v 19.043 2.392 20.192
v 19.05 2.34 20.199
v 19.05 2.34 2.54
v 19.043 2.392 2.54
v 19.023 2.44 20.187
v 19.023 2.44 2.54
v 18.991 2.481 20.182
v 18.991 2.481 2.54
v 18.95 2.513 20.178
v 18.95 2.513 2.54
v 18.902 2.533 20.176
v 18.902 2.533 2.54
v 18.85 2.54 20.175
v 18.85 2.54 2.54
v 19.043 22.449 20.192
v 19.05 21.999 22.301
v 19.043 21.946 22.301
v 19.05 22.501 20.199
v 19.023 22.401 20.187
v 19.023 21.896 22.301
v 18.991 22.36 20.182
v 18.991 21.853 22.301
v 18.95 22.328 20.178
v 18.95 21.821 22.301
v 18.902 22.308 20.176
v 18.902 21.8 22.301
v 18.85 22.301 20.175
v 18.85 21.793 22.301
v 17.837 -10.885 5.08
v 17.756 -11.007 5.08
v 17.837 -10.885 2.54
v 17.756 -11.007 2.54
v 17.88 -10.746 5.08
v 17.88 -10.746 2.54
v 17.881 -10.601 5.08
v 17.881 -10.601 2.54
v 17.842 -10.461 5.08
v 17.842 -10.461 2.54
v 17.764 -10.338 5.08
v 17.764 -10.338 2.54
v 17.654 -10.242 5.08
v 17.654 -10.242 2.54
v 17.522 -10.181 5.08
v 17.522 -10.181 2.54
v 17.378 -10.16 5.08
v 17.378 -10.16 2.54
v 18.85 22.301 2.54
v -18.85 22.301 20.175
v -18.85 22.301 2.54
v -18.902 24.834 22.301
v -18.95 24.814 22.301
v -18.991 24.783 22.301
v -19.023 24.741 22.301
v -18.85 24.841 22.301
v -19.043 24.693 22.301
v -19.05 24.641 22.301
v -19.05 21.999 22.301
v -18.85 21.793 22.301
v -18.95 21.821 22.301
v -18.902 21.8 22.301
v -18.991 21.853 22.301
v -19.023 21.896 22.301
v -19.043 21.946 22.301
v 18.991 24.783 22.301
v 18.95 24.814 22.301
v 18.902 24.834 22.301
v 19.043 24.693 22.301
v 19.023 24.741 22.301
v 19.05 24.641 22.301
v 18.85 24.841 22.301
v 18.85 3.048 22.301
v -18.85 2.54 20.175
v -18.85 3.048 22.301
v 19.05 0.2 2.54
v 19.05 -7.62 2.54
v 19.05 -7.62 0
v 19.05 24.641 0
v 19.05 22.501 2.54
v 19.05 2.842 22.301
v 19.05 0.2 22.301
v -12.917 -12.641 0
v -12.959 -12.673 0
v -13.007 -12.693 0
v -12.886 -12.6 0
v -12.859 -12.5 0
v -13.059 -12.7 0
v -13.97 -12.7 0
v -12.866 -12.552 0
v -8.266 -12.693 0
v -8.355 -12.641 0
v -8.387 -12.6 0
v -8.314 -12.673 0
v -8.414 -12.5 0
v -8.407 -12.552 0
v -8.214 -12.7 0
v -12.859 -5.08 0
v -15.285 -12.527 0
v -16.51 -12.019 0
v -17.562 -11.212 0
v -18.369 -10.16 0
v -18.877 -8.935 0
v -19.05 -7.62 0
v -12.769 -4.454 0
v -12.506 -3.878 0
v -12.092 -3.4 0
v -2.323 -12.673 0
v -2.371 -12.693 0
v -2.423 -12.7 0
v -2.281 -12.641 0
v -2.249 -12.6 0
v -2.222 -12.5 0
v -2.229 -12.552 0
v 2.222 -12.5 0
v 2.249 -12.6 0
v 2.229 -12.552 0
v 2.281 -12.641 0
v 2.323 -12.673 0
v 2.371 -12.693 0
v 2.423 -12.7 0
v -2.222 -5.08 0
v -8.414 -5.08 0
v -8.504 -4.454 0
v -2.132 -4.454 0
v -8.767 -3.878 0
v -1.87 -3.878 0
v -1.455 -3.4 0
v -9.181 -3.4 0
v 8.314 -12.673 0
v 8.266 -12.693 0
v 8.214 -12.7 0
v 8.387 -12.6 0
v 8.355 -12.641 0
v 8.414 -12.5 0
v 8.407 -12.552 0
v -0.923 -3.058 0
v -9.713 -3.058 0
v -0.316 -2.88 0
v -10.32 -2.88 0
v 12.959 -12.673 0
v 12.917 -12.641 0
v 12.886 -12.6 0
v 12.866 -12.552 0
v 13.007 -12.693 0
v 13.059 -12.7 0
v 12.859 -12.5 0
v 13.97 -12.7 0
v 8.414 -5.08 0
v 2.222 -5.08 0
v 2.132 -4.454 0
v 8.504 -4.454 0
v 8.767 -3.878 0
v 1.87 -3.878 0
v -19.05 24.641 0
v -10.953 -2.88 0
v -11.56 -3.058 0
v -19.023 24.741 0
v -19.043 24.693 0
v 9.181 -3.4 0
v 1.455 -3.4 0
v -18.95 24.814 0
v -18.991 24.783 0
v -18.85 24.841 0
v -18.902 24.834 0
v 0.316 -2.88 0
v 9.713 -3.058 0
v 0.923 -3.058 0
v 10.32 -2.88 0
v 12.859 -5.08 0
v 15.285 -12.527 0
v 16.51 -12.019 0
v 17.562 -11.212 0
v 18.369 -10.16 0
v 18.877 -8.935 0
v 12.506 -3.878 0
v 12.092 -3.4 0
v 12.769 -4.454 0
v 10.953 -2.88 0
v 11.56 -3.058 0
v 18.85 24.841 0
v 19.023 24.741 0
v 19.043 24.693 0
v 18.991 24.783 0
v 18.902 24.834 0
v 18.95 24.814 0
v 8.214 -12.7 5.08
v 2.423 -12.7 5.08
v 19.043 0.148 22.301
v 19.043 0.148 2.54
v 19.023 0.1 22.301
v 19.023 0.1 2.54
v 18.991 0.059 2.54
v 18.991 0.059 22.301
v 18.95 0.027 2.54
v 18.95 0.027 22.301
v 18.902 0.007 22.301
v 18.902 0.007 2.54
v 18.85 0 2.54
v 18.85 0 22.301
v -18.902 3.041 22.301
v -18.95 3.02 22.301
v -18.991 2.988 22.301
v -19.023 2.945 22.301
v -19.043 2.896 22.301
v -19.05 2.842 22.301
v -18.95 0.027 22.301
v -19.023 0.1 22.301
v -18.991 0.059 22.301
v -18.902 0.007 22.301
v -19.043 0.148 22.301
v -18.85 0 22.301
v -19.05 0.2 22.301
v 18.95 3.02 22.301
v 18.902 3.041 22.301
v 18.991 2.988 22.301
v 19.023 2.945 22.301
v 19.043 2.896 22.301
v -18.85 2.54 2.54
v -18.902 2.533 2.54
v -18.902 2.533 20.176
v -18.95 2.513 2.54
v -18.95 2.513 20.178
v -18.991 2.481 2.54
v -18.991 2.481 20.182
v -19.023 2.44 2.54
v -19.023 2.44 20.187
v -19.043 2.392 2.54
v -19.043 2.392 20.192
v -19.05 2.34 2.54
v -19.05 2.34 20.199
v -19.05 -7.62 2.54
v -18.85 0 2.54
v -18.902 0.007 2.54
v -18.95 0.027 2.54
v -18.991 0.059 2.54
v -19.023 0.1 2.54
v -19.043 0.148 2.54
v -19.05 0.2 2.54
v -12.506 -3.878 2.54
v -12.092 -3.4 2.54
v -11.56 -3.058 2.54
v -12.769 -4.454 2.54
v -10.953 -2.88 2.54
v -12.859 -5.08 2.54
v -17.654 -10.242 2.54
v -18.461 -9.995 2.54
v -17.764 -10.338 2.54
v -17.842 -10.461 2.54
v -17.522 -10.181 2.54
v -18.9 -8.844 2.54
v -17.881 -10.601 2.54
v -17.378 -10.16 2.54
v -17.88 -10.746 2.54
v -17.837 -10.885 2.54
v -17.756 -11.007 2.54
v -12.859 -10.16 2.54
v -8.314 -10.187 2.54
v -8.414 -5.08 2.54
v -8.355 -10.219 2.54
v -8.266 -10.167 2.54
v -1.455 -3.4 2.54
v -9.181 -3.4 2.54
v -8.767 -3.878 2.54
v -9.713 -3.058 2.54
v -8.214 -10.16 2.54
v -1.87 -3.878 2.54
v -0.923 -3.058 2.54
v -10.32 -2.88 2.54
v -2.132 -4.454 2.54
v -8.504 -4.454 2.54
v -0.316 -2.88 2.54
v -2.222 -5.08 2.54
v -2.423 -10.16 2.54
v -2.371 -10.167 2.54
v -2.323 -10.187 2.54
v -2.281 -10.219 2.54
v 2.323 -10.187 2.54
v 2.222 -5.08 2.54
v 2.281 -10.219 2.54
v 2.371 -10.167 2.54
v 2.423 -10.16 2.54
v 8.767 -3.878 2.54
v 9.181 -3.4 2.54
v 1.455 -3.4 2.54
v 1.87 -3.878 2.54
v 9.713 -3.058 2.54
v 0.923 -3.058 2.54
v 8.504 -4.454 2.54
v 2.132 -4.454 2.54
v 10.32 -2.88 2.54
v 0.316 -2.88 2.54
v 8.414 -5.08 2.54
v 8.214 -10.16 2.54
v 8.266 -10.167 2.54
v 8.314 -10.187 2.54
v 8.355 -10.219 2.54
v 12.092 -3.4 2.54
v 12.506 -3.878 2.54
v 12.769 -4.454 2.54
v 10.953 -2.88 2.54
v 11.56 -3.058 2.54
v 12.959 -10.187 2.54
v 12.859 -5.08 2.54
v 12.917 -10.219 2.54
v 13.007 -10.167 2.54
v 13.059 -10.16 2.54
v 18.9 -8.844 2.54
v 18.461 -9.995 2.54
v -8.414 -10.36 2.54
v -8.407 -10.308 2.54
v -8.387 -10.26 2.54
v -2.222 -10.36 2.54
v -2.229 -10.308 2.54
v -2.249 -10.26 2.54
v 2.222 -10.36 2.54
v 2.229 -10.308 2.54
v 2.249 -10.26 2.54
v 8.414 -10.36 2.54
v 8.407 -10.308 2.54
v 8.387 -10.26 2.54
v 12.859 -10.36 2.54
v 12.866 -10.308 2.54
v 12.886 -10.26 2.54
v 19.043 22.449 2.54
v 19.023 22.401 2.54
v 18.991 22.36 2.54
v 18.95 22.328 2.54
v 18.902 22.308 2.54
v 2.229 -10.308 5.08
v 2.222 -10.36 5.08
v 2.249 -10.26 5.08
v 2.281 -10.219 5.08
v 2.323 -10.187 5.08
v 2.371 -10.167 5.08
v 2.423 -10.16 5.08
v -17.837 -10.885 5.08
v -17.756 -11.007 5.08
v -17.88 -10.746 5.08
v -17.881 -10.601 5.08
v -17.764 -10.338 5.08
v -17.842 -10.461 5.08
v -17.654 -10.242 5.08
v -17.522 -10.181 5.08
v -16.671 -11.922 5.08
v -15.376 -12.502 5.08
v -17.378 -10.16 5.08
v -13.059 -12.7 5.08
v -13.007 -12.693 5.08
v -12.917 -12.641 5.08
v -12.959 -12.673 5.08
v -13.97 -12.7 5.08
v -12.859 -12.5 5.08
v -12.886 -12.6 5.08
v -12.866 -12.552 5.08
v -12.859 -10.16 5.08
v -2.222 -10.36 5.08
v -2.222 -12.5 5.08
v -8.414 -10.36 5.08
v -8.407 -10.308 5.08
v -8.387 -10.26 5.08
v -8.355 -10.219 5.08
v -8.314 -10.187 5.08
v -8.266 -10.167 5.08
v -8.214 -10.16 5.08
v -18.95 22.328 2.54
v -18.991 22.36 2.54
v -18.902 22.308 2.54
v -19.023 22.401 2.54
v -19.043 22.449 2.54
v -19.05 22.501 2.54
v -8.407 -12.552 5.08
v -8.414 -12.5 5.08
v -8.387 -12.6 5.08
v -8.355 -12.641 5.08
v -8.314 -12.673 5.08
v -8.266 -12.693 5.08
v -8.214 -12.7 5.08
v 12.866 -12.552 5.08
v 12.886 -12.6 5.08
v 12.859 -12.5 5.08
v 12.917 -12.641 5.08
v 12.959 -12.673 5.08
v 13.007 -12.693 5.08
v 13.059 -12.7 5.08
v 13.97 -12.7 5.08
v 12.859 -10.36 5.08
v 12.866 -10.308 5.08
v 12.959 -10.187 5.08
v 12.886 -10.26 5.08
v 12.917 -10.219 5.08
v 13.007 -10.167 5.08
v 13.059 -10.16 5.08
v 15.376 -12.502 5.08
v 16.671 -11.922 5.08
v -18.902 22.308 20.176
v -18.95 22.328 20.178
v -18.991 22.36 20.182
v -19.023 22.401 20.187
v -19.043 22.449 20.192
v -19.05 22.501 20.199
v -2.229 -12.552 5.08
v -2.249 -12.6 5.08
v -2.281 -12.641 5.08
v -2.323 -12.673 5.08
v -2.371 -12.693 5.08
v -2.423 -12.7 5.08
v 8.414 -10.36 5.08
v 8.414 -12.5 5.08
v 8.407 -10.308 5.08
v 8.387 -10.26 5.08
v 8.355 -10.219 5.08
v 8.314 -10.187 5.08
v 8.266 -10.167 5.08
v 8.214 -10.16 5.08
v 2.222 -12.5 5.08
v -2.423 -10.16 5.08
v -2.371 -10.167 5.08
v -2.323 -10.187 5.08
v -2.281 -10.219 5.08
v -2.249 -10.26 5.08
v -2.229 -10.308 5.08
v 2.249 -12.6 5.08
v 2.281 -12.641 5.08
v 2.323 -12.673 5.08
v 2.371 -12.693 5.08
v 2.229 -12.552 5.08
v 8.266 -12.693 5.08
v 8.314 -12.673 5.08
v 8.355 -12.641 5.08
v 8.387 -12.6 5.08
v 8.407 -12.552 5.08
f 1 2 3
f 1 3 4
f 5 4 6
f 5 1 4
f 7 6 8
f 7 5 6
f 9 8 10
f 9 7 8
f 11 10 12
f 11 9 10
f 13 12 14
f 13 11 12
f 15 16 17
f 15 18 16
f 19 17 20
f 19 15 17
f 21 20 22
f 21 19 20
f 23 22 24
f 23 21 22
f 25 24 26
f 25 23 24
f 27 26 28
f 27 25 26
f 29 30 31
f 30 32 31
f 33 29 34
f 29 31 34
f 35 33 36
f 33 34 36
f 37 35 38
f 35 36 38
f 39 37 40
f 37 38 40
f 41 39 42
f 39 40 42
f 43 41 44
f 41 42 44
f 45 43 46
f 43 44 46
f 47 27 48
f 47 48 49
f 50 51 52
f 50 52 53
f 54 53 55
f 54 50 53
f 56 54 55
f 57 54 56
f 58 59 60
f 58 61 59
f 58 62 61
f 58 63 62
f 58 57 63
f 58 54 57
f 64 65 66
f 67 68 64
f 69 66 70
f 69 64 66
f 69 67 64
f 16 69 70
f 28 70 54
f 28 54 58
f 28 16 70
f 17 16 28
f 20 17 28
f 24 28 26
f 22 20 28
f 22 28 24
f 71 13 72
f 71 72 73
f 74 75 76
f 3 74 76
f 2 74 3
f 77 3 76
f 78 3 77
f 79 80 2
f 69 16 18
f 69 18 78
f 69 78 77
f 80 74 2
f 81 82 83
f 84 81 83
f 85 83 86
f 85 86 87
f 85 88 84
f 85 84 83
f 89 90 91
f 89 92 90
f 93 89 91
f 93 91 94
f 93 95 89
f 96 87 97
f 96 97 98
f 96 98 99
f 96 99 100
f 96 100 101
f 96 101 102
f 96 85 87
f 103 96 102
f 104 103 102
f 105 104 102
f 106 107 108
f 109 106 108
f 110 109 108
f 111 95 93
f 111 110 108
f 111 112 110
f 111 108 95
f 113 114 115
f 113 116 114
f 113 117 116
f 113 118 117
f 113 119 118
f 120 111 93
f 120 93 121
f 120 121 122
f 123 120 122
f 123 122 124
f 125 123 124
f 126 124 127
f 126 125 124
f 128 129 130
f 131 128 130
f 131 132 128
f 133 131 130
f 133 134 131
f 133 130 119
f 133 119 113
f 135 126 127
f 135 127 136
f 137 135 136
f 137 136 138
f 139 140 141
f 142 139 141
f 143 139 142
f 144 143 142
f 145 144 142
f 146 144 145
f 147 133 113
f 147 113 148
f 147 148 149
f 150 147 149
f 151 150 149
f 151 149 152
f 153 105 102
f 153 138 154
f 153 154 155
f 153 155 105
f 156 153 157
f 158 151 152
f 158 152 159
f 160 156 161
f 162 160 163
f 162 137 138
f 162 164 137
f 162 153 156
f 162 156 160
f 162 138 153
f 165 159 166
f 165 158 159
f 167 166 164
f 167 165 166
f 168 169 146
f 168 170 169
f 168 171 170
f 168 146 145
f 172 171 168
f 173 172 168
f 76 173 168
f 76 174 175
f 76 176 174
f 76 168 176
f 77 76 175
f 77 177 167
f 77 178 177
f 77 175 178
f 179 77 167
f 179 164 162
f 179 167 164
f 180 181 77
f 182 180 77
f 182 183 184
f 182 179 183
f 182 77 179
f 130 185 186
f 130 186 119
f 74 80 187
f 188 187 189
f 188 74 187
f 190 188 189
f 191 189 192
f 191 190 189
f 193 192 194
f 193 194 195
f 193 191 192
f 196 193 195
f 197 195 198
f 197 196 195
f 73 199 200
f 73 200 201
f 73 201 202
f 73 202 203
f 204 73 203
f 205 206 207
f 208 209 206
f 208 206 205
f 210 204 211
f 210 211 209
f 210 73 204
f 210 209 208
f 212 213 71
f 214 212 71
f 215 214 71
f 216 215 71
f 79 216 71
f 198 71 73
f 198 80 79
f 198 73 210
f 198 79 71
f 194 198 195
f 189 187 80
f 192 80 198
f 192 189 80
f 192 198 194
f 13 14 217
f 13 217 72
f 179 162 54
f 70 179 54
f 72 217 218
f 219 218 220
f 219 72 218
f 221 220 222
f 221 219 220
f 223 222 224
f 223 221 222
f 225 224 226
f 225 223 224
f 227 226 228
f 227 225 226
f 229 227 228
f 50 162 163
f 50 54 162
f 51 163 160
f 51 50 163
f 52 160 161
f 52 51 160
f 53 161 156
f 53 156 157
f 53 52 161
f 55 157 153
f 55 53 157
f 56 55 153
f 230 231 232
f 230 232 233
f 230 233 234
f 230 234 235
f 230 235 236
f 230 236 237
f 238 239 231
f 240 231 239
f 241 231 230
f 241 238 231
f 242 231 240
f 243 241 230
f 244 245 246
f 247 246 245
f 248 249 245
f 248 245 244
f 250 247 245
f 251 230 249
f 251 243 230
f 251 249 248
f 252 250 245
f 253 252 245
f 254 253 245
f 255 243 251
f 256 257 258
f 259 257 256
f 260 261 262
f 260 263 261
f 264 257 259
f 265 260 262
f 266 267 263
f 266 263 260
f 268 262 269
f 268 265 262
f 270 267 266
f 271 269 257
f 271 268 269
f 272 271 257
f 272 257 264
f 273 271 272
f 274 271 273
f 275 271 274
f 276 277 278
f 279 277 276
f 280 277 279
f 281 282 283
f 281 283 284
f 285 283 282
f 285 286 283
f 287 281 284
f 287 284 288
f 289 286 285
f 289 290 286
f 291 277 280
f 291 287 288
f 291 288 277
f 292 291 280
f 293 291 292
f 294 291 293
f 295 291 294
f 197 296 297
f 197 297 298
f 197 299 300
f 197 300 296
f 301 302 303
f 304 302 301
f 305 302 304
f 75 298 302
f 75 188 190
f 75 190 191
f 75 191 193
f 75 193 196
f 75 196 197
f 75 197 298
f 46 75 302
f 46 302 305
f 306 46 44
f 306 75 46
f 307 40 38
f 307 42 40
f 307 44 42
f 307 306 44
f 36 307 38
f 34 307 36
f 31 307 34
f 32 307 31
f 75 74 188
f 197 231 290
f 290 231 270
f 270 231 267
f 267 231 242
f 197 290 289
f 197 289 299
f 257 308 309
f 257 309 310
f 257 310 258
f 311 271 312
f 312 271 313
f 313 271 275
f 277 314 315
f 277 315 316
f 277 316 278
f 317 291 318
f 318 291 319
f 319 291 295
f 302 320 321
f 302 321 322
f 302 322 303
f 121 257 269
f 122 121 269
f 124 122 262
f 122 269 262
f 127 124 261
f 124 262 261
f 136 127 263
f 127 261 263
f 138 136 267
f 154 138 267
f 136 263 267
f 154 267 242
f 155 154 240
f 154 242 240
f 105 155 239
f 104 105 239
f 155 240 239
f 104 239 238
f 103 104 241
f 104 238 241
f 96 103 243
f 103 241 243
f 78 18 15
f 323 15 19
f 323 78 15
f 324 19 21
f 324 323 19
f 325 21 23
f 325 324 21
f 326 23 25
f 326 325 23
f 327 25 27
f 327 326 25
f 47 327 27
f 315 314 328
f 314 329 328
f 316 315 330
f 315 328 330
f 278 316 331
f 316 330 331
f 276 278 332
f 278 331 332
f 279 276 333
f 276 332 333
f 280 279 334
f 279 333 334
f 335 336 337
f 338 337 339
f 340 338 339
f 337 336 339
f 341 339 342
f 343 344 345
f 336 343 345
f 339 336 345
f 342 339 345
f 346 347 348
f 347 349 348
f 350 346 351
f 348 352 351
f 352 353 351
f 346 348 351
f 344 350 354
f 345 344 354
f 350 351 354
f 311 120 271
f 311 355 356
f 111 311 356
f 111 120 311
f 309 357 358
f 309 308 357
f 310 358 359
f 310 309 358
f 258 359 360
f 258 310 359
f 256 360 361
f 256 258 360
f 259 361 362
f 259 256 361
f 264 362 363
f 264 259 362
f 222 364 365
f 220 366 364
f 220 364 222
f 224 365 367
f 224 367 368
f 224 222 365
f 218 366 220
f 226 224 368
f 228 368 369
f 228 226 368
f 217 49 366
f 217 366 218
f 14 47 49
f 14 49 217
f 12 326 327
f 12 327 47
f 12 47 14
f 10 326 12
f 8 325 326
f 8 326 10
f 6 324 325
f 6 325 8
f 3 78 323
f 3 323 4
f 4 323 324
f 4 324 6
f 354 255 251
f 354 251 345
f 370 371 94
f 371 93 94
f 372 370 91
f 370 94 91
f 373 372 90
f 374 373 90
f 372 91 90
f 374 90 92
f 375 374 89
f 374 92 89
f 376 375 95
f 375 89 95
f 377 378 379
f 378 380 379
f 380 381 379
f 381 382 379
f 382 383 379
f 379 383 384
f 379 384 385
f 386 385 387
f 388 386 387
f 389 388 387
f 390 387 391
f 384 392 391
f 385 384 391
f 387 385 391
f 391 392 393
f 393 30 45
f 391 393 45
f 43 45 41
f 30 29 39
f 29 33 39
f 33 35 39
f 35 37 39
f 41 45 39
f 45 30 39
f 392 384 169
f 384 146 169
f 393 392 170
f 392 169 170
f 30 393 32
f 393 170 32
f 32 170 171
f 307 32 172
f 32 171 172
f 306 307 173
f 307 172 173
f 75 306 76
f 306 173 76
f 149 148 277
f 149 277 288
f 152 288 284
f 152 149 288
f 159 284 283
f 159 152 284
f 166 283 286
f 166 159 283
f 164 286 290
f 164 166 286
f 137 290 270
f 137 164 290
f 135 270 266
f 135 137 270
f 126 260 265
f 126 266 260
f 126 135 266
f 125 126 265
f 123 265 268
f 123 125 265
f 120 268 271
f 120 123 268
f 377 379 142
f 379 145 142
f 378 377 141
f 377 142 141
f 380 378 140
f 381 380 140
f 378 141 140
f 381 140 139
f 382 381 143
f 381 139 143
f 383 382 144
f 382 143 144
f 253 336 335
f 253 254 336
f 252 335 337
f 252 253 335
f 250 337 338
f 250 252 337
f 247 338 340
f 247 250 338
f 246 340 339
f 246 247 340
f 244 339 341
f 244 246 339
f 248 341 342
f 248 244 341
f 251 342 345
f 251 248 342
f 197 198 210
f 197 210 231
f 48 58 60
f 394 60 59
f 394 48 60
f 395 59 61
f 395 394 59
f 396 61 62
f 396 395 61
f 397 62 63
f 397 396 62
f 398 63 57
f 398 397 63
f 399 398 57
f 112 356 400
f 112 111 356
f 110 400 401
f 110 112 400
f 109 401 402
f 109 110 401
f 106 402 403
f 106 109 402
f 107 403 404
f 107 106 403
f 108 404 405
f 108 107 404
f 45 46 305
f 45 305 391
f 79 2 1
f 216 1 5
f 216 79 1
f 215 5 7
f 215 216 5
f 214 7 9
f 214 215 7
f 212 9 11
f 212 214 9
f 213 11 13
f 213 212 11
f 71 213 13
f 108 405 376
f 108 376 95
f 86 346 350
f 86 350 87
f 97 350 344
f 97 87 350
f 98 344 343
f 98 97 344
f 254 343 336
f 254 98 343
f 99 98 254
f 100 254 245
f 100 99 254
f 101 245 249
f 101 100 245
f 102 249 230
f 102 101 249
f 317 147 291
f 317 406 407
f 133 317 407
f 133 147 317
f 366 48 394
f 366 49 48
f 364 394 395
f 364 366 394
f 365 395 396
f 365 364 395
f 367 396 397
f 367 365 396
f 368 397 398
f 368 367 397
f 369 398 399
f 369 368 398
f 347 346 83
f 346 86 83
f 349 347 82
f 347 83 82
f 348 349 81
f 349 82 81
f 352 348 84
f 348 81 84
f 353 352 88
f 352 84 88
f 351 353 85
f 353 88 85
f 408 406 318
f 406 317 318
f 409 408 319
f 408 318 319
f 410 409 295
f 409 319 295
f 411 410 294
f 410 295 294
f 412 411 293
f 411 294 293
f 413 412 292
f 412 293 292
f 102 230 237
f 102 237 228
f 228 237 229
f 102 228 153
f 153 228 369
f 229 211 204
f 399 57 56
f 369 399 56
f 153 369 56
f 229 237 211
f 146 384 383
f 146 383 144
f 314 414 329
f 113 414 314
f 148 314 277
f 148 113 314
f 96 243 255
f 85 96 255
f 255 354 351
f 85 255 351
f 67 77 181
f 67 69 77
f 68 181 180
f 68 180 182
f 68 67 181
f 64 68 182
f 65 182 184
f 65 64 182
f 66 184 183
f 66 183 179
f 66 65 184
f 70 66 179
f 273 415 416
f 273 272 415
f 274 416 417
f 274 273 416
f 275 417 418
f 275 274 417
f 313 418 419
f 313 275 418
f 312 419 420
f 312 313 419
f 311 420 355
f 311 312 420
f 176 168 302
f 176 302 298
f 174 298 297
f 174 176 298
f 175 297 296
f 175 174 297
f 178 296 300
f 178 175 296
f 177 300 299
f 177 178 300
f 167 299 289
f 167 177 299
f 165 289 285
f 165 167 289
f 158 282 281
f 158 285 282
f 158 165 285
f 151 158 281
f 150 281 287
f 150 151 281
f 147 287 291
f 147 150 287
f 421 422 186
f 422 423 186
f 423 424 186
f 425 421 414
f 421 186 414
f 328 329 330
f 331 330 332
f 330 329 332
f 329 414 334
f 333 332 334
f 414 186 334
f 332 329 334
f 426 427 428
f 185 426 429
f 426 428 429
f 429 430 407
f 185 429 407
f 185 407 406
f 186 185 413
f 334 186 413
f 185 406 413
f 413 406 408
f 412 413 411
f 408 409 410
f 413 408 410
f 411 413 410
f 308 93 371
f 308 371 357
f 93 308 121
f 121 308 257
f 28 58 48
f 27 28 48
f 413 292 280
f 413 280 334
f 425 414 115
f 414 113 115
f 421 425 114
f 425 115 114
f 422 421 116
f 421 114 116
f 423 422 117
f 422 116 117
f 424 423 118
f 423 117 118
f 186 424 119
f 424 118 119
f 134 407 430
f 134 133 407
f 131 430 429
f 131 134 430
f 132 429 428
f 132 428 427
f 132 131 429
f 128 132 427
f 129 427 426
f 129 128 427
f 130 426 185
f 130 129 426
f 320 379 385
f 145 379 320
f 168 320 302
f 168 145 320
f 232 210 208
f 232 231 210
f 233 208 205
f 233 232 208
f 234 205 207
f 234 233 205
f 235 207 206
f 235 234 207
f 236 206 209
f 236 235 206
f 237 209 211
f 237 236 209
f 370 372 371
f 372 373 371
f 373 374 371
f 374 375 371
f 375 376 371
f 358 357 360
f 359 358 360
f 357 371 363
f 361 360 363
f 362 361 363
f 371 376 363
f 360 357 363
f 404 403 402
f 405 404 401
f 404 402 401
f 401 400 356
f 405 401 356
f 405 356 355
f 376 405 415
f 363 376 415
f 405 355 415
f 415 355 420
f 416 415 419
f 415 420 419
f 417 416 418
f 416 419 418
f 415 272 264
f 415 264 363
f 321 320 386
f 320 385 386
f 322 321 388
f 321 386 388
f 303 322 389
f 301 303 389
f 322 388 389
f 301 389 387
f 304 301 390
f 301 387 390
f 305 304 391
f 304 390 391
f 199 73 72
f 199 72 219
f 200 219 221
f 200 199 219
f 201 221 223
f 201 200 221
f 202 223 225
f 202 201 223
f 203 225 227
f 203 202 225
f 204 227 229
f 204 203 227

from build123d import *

# Parameters (mm, degrees)
F0_W     = 2.54
F0_H     = 2.54
F1_DEPTH = 19.05
F3_DEPTH = 12.7
F4_R     = 5.08
F5_R     = 0.508
F6_R     = 0.2


with BuildPart() as f1:
    # F0 (on Right) → F1 (new body, symmetric)
    with BuildSketch(Plane.YZ):
        Polygon((-12.7, 0), (0, 0), (2.54, 0), (24.8412, 0), (24.8412, 2.54), (24.8412, 22.3012), (22.3012, 22.3012), (21.7932, 22.3012), (22.3012, 20.1749913394), (22.3012, 2.54), (2.54, 2.54), (2.54, 20.1749913394), (2.54, 22.3012), (0, 22.3012), (0, 2.54), (-10.16, 2.54), (-12.7, 2.54), align=None)
        with Locations((-11.43, 3.81)):
            Rectangle(F0_W, F0_H)
        Polygon((3.048, 22.3012), (2.54, 22.3012), (2.54, 20.1749913394), align=None)
    extrude(amount=F1_DEPTH, both=True)

    # F2 (on face) → F3 (cut, symmetric)
    with BuildSketch(Plane.XY.offset(2.54)):
        with BuildLine():
            Line((2.2225, -12.7), (2.2225, -5.08))
            ThreePointArc((2.2225, -5.08), (0, -2.8575), (-2.2225, -5.08))
            Line((-2.2225, -5.08), (-2.2225, -12.7))
            Line((-2.2225, -12.7), (2.2225, -12.7))
        make_face()
        with BuildLine():
            Line((12.85875, -12.7), (12.85875, -5.08))
            ThreePointArc((12.85875, -5.08), (10.63625, -2.8575), (8.41375, -5.08))
            Line((8.41375, -5.08), (8.41375, -12.7))
            Line((8.41375, -12.7), (12.85875, -12.7))
        make_face()
        with BuildLine():
            Line((-8.41375, -12.7), (-8.41375, -5.08))
            ThreePointArc((-8.41375, -5.08), (-10.63625, -2.8575), (-12.85875, -5.08))
            Line((-12.85875, -5.08), (-12.85875, -12.7))
            Line((-12.85875, -12.7), (-8.41375, -12.7))
        make_face()
    extrude(amount=F3_DEPTH, both=True, mode=Mode.SUBTRACT)

    # F4
    f4_edges = [f1.edges().sort_by_distance(p)[0] for p in [
        (19.05, -12.7, 2.54),
        (-19.05, -12.7, 2.54),
    ]]
    fillet(f4_edges, radius=F4_R)

    # F5
    f5_edges = [f1.edges().sort_by_distance(p)[0] for p in [
        (-18.369409, -10.16, 3.81),
        (18.369409, -10.16, 3.81),
    ]]
    fillet(f5_edges, radius=F5_R)

    # F6
    f6_edges = [f1.edges().sort_by_distance(p)[0] for p in [
        (-12.85875, -12.7, 2.54),
        (-8.41375, -12.7, 2.54),
        (-2.2225, -12.7, 2.54),
        (2.2225, -12.7, 2.54),
        (8.41375, -12.7, 2.54),
        (12.85875, -12.7, 2.54),
        (12.85875, -10.16, 3.81),
        (8.41375, -10.16, 3.81),
        (2.2225, -10.16, 3.81),
        (-2.2225, -10.16, 3.81),
        (-8.41375, -10.16, 3.81),
        (19.05, 0, 12.4206),
        (19.05, 2.54, 11.357496),
        (19.05, 2.794, 21.238096),
        (19.05, 22.3012, 11.357496),
        (19.05, 24.8412, 11.1506),
        (19.05, 22.0472, 21.238096),
        (-19.05, 0, 12.4206),
        (-19.05, 2.54, 11.357496),
        (-19.05, 22.3012, 11.357496),
        (-19.05, 24.8412, 11.1506),
        (-19.05, 22.0472, 21.238096),
        (-19.05, 2.794, 21.238096),
    ]]
    fillet(f6_edges, radius=F6_R)


solid = f1.part
